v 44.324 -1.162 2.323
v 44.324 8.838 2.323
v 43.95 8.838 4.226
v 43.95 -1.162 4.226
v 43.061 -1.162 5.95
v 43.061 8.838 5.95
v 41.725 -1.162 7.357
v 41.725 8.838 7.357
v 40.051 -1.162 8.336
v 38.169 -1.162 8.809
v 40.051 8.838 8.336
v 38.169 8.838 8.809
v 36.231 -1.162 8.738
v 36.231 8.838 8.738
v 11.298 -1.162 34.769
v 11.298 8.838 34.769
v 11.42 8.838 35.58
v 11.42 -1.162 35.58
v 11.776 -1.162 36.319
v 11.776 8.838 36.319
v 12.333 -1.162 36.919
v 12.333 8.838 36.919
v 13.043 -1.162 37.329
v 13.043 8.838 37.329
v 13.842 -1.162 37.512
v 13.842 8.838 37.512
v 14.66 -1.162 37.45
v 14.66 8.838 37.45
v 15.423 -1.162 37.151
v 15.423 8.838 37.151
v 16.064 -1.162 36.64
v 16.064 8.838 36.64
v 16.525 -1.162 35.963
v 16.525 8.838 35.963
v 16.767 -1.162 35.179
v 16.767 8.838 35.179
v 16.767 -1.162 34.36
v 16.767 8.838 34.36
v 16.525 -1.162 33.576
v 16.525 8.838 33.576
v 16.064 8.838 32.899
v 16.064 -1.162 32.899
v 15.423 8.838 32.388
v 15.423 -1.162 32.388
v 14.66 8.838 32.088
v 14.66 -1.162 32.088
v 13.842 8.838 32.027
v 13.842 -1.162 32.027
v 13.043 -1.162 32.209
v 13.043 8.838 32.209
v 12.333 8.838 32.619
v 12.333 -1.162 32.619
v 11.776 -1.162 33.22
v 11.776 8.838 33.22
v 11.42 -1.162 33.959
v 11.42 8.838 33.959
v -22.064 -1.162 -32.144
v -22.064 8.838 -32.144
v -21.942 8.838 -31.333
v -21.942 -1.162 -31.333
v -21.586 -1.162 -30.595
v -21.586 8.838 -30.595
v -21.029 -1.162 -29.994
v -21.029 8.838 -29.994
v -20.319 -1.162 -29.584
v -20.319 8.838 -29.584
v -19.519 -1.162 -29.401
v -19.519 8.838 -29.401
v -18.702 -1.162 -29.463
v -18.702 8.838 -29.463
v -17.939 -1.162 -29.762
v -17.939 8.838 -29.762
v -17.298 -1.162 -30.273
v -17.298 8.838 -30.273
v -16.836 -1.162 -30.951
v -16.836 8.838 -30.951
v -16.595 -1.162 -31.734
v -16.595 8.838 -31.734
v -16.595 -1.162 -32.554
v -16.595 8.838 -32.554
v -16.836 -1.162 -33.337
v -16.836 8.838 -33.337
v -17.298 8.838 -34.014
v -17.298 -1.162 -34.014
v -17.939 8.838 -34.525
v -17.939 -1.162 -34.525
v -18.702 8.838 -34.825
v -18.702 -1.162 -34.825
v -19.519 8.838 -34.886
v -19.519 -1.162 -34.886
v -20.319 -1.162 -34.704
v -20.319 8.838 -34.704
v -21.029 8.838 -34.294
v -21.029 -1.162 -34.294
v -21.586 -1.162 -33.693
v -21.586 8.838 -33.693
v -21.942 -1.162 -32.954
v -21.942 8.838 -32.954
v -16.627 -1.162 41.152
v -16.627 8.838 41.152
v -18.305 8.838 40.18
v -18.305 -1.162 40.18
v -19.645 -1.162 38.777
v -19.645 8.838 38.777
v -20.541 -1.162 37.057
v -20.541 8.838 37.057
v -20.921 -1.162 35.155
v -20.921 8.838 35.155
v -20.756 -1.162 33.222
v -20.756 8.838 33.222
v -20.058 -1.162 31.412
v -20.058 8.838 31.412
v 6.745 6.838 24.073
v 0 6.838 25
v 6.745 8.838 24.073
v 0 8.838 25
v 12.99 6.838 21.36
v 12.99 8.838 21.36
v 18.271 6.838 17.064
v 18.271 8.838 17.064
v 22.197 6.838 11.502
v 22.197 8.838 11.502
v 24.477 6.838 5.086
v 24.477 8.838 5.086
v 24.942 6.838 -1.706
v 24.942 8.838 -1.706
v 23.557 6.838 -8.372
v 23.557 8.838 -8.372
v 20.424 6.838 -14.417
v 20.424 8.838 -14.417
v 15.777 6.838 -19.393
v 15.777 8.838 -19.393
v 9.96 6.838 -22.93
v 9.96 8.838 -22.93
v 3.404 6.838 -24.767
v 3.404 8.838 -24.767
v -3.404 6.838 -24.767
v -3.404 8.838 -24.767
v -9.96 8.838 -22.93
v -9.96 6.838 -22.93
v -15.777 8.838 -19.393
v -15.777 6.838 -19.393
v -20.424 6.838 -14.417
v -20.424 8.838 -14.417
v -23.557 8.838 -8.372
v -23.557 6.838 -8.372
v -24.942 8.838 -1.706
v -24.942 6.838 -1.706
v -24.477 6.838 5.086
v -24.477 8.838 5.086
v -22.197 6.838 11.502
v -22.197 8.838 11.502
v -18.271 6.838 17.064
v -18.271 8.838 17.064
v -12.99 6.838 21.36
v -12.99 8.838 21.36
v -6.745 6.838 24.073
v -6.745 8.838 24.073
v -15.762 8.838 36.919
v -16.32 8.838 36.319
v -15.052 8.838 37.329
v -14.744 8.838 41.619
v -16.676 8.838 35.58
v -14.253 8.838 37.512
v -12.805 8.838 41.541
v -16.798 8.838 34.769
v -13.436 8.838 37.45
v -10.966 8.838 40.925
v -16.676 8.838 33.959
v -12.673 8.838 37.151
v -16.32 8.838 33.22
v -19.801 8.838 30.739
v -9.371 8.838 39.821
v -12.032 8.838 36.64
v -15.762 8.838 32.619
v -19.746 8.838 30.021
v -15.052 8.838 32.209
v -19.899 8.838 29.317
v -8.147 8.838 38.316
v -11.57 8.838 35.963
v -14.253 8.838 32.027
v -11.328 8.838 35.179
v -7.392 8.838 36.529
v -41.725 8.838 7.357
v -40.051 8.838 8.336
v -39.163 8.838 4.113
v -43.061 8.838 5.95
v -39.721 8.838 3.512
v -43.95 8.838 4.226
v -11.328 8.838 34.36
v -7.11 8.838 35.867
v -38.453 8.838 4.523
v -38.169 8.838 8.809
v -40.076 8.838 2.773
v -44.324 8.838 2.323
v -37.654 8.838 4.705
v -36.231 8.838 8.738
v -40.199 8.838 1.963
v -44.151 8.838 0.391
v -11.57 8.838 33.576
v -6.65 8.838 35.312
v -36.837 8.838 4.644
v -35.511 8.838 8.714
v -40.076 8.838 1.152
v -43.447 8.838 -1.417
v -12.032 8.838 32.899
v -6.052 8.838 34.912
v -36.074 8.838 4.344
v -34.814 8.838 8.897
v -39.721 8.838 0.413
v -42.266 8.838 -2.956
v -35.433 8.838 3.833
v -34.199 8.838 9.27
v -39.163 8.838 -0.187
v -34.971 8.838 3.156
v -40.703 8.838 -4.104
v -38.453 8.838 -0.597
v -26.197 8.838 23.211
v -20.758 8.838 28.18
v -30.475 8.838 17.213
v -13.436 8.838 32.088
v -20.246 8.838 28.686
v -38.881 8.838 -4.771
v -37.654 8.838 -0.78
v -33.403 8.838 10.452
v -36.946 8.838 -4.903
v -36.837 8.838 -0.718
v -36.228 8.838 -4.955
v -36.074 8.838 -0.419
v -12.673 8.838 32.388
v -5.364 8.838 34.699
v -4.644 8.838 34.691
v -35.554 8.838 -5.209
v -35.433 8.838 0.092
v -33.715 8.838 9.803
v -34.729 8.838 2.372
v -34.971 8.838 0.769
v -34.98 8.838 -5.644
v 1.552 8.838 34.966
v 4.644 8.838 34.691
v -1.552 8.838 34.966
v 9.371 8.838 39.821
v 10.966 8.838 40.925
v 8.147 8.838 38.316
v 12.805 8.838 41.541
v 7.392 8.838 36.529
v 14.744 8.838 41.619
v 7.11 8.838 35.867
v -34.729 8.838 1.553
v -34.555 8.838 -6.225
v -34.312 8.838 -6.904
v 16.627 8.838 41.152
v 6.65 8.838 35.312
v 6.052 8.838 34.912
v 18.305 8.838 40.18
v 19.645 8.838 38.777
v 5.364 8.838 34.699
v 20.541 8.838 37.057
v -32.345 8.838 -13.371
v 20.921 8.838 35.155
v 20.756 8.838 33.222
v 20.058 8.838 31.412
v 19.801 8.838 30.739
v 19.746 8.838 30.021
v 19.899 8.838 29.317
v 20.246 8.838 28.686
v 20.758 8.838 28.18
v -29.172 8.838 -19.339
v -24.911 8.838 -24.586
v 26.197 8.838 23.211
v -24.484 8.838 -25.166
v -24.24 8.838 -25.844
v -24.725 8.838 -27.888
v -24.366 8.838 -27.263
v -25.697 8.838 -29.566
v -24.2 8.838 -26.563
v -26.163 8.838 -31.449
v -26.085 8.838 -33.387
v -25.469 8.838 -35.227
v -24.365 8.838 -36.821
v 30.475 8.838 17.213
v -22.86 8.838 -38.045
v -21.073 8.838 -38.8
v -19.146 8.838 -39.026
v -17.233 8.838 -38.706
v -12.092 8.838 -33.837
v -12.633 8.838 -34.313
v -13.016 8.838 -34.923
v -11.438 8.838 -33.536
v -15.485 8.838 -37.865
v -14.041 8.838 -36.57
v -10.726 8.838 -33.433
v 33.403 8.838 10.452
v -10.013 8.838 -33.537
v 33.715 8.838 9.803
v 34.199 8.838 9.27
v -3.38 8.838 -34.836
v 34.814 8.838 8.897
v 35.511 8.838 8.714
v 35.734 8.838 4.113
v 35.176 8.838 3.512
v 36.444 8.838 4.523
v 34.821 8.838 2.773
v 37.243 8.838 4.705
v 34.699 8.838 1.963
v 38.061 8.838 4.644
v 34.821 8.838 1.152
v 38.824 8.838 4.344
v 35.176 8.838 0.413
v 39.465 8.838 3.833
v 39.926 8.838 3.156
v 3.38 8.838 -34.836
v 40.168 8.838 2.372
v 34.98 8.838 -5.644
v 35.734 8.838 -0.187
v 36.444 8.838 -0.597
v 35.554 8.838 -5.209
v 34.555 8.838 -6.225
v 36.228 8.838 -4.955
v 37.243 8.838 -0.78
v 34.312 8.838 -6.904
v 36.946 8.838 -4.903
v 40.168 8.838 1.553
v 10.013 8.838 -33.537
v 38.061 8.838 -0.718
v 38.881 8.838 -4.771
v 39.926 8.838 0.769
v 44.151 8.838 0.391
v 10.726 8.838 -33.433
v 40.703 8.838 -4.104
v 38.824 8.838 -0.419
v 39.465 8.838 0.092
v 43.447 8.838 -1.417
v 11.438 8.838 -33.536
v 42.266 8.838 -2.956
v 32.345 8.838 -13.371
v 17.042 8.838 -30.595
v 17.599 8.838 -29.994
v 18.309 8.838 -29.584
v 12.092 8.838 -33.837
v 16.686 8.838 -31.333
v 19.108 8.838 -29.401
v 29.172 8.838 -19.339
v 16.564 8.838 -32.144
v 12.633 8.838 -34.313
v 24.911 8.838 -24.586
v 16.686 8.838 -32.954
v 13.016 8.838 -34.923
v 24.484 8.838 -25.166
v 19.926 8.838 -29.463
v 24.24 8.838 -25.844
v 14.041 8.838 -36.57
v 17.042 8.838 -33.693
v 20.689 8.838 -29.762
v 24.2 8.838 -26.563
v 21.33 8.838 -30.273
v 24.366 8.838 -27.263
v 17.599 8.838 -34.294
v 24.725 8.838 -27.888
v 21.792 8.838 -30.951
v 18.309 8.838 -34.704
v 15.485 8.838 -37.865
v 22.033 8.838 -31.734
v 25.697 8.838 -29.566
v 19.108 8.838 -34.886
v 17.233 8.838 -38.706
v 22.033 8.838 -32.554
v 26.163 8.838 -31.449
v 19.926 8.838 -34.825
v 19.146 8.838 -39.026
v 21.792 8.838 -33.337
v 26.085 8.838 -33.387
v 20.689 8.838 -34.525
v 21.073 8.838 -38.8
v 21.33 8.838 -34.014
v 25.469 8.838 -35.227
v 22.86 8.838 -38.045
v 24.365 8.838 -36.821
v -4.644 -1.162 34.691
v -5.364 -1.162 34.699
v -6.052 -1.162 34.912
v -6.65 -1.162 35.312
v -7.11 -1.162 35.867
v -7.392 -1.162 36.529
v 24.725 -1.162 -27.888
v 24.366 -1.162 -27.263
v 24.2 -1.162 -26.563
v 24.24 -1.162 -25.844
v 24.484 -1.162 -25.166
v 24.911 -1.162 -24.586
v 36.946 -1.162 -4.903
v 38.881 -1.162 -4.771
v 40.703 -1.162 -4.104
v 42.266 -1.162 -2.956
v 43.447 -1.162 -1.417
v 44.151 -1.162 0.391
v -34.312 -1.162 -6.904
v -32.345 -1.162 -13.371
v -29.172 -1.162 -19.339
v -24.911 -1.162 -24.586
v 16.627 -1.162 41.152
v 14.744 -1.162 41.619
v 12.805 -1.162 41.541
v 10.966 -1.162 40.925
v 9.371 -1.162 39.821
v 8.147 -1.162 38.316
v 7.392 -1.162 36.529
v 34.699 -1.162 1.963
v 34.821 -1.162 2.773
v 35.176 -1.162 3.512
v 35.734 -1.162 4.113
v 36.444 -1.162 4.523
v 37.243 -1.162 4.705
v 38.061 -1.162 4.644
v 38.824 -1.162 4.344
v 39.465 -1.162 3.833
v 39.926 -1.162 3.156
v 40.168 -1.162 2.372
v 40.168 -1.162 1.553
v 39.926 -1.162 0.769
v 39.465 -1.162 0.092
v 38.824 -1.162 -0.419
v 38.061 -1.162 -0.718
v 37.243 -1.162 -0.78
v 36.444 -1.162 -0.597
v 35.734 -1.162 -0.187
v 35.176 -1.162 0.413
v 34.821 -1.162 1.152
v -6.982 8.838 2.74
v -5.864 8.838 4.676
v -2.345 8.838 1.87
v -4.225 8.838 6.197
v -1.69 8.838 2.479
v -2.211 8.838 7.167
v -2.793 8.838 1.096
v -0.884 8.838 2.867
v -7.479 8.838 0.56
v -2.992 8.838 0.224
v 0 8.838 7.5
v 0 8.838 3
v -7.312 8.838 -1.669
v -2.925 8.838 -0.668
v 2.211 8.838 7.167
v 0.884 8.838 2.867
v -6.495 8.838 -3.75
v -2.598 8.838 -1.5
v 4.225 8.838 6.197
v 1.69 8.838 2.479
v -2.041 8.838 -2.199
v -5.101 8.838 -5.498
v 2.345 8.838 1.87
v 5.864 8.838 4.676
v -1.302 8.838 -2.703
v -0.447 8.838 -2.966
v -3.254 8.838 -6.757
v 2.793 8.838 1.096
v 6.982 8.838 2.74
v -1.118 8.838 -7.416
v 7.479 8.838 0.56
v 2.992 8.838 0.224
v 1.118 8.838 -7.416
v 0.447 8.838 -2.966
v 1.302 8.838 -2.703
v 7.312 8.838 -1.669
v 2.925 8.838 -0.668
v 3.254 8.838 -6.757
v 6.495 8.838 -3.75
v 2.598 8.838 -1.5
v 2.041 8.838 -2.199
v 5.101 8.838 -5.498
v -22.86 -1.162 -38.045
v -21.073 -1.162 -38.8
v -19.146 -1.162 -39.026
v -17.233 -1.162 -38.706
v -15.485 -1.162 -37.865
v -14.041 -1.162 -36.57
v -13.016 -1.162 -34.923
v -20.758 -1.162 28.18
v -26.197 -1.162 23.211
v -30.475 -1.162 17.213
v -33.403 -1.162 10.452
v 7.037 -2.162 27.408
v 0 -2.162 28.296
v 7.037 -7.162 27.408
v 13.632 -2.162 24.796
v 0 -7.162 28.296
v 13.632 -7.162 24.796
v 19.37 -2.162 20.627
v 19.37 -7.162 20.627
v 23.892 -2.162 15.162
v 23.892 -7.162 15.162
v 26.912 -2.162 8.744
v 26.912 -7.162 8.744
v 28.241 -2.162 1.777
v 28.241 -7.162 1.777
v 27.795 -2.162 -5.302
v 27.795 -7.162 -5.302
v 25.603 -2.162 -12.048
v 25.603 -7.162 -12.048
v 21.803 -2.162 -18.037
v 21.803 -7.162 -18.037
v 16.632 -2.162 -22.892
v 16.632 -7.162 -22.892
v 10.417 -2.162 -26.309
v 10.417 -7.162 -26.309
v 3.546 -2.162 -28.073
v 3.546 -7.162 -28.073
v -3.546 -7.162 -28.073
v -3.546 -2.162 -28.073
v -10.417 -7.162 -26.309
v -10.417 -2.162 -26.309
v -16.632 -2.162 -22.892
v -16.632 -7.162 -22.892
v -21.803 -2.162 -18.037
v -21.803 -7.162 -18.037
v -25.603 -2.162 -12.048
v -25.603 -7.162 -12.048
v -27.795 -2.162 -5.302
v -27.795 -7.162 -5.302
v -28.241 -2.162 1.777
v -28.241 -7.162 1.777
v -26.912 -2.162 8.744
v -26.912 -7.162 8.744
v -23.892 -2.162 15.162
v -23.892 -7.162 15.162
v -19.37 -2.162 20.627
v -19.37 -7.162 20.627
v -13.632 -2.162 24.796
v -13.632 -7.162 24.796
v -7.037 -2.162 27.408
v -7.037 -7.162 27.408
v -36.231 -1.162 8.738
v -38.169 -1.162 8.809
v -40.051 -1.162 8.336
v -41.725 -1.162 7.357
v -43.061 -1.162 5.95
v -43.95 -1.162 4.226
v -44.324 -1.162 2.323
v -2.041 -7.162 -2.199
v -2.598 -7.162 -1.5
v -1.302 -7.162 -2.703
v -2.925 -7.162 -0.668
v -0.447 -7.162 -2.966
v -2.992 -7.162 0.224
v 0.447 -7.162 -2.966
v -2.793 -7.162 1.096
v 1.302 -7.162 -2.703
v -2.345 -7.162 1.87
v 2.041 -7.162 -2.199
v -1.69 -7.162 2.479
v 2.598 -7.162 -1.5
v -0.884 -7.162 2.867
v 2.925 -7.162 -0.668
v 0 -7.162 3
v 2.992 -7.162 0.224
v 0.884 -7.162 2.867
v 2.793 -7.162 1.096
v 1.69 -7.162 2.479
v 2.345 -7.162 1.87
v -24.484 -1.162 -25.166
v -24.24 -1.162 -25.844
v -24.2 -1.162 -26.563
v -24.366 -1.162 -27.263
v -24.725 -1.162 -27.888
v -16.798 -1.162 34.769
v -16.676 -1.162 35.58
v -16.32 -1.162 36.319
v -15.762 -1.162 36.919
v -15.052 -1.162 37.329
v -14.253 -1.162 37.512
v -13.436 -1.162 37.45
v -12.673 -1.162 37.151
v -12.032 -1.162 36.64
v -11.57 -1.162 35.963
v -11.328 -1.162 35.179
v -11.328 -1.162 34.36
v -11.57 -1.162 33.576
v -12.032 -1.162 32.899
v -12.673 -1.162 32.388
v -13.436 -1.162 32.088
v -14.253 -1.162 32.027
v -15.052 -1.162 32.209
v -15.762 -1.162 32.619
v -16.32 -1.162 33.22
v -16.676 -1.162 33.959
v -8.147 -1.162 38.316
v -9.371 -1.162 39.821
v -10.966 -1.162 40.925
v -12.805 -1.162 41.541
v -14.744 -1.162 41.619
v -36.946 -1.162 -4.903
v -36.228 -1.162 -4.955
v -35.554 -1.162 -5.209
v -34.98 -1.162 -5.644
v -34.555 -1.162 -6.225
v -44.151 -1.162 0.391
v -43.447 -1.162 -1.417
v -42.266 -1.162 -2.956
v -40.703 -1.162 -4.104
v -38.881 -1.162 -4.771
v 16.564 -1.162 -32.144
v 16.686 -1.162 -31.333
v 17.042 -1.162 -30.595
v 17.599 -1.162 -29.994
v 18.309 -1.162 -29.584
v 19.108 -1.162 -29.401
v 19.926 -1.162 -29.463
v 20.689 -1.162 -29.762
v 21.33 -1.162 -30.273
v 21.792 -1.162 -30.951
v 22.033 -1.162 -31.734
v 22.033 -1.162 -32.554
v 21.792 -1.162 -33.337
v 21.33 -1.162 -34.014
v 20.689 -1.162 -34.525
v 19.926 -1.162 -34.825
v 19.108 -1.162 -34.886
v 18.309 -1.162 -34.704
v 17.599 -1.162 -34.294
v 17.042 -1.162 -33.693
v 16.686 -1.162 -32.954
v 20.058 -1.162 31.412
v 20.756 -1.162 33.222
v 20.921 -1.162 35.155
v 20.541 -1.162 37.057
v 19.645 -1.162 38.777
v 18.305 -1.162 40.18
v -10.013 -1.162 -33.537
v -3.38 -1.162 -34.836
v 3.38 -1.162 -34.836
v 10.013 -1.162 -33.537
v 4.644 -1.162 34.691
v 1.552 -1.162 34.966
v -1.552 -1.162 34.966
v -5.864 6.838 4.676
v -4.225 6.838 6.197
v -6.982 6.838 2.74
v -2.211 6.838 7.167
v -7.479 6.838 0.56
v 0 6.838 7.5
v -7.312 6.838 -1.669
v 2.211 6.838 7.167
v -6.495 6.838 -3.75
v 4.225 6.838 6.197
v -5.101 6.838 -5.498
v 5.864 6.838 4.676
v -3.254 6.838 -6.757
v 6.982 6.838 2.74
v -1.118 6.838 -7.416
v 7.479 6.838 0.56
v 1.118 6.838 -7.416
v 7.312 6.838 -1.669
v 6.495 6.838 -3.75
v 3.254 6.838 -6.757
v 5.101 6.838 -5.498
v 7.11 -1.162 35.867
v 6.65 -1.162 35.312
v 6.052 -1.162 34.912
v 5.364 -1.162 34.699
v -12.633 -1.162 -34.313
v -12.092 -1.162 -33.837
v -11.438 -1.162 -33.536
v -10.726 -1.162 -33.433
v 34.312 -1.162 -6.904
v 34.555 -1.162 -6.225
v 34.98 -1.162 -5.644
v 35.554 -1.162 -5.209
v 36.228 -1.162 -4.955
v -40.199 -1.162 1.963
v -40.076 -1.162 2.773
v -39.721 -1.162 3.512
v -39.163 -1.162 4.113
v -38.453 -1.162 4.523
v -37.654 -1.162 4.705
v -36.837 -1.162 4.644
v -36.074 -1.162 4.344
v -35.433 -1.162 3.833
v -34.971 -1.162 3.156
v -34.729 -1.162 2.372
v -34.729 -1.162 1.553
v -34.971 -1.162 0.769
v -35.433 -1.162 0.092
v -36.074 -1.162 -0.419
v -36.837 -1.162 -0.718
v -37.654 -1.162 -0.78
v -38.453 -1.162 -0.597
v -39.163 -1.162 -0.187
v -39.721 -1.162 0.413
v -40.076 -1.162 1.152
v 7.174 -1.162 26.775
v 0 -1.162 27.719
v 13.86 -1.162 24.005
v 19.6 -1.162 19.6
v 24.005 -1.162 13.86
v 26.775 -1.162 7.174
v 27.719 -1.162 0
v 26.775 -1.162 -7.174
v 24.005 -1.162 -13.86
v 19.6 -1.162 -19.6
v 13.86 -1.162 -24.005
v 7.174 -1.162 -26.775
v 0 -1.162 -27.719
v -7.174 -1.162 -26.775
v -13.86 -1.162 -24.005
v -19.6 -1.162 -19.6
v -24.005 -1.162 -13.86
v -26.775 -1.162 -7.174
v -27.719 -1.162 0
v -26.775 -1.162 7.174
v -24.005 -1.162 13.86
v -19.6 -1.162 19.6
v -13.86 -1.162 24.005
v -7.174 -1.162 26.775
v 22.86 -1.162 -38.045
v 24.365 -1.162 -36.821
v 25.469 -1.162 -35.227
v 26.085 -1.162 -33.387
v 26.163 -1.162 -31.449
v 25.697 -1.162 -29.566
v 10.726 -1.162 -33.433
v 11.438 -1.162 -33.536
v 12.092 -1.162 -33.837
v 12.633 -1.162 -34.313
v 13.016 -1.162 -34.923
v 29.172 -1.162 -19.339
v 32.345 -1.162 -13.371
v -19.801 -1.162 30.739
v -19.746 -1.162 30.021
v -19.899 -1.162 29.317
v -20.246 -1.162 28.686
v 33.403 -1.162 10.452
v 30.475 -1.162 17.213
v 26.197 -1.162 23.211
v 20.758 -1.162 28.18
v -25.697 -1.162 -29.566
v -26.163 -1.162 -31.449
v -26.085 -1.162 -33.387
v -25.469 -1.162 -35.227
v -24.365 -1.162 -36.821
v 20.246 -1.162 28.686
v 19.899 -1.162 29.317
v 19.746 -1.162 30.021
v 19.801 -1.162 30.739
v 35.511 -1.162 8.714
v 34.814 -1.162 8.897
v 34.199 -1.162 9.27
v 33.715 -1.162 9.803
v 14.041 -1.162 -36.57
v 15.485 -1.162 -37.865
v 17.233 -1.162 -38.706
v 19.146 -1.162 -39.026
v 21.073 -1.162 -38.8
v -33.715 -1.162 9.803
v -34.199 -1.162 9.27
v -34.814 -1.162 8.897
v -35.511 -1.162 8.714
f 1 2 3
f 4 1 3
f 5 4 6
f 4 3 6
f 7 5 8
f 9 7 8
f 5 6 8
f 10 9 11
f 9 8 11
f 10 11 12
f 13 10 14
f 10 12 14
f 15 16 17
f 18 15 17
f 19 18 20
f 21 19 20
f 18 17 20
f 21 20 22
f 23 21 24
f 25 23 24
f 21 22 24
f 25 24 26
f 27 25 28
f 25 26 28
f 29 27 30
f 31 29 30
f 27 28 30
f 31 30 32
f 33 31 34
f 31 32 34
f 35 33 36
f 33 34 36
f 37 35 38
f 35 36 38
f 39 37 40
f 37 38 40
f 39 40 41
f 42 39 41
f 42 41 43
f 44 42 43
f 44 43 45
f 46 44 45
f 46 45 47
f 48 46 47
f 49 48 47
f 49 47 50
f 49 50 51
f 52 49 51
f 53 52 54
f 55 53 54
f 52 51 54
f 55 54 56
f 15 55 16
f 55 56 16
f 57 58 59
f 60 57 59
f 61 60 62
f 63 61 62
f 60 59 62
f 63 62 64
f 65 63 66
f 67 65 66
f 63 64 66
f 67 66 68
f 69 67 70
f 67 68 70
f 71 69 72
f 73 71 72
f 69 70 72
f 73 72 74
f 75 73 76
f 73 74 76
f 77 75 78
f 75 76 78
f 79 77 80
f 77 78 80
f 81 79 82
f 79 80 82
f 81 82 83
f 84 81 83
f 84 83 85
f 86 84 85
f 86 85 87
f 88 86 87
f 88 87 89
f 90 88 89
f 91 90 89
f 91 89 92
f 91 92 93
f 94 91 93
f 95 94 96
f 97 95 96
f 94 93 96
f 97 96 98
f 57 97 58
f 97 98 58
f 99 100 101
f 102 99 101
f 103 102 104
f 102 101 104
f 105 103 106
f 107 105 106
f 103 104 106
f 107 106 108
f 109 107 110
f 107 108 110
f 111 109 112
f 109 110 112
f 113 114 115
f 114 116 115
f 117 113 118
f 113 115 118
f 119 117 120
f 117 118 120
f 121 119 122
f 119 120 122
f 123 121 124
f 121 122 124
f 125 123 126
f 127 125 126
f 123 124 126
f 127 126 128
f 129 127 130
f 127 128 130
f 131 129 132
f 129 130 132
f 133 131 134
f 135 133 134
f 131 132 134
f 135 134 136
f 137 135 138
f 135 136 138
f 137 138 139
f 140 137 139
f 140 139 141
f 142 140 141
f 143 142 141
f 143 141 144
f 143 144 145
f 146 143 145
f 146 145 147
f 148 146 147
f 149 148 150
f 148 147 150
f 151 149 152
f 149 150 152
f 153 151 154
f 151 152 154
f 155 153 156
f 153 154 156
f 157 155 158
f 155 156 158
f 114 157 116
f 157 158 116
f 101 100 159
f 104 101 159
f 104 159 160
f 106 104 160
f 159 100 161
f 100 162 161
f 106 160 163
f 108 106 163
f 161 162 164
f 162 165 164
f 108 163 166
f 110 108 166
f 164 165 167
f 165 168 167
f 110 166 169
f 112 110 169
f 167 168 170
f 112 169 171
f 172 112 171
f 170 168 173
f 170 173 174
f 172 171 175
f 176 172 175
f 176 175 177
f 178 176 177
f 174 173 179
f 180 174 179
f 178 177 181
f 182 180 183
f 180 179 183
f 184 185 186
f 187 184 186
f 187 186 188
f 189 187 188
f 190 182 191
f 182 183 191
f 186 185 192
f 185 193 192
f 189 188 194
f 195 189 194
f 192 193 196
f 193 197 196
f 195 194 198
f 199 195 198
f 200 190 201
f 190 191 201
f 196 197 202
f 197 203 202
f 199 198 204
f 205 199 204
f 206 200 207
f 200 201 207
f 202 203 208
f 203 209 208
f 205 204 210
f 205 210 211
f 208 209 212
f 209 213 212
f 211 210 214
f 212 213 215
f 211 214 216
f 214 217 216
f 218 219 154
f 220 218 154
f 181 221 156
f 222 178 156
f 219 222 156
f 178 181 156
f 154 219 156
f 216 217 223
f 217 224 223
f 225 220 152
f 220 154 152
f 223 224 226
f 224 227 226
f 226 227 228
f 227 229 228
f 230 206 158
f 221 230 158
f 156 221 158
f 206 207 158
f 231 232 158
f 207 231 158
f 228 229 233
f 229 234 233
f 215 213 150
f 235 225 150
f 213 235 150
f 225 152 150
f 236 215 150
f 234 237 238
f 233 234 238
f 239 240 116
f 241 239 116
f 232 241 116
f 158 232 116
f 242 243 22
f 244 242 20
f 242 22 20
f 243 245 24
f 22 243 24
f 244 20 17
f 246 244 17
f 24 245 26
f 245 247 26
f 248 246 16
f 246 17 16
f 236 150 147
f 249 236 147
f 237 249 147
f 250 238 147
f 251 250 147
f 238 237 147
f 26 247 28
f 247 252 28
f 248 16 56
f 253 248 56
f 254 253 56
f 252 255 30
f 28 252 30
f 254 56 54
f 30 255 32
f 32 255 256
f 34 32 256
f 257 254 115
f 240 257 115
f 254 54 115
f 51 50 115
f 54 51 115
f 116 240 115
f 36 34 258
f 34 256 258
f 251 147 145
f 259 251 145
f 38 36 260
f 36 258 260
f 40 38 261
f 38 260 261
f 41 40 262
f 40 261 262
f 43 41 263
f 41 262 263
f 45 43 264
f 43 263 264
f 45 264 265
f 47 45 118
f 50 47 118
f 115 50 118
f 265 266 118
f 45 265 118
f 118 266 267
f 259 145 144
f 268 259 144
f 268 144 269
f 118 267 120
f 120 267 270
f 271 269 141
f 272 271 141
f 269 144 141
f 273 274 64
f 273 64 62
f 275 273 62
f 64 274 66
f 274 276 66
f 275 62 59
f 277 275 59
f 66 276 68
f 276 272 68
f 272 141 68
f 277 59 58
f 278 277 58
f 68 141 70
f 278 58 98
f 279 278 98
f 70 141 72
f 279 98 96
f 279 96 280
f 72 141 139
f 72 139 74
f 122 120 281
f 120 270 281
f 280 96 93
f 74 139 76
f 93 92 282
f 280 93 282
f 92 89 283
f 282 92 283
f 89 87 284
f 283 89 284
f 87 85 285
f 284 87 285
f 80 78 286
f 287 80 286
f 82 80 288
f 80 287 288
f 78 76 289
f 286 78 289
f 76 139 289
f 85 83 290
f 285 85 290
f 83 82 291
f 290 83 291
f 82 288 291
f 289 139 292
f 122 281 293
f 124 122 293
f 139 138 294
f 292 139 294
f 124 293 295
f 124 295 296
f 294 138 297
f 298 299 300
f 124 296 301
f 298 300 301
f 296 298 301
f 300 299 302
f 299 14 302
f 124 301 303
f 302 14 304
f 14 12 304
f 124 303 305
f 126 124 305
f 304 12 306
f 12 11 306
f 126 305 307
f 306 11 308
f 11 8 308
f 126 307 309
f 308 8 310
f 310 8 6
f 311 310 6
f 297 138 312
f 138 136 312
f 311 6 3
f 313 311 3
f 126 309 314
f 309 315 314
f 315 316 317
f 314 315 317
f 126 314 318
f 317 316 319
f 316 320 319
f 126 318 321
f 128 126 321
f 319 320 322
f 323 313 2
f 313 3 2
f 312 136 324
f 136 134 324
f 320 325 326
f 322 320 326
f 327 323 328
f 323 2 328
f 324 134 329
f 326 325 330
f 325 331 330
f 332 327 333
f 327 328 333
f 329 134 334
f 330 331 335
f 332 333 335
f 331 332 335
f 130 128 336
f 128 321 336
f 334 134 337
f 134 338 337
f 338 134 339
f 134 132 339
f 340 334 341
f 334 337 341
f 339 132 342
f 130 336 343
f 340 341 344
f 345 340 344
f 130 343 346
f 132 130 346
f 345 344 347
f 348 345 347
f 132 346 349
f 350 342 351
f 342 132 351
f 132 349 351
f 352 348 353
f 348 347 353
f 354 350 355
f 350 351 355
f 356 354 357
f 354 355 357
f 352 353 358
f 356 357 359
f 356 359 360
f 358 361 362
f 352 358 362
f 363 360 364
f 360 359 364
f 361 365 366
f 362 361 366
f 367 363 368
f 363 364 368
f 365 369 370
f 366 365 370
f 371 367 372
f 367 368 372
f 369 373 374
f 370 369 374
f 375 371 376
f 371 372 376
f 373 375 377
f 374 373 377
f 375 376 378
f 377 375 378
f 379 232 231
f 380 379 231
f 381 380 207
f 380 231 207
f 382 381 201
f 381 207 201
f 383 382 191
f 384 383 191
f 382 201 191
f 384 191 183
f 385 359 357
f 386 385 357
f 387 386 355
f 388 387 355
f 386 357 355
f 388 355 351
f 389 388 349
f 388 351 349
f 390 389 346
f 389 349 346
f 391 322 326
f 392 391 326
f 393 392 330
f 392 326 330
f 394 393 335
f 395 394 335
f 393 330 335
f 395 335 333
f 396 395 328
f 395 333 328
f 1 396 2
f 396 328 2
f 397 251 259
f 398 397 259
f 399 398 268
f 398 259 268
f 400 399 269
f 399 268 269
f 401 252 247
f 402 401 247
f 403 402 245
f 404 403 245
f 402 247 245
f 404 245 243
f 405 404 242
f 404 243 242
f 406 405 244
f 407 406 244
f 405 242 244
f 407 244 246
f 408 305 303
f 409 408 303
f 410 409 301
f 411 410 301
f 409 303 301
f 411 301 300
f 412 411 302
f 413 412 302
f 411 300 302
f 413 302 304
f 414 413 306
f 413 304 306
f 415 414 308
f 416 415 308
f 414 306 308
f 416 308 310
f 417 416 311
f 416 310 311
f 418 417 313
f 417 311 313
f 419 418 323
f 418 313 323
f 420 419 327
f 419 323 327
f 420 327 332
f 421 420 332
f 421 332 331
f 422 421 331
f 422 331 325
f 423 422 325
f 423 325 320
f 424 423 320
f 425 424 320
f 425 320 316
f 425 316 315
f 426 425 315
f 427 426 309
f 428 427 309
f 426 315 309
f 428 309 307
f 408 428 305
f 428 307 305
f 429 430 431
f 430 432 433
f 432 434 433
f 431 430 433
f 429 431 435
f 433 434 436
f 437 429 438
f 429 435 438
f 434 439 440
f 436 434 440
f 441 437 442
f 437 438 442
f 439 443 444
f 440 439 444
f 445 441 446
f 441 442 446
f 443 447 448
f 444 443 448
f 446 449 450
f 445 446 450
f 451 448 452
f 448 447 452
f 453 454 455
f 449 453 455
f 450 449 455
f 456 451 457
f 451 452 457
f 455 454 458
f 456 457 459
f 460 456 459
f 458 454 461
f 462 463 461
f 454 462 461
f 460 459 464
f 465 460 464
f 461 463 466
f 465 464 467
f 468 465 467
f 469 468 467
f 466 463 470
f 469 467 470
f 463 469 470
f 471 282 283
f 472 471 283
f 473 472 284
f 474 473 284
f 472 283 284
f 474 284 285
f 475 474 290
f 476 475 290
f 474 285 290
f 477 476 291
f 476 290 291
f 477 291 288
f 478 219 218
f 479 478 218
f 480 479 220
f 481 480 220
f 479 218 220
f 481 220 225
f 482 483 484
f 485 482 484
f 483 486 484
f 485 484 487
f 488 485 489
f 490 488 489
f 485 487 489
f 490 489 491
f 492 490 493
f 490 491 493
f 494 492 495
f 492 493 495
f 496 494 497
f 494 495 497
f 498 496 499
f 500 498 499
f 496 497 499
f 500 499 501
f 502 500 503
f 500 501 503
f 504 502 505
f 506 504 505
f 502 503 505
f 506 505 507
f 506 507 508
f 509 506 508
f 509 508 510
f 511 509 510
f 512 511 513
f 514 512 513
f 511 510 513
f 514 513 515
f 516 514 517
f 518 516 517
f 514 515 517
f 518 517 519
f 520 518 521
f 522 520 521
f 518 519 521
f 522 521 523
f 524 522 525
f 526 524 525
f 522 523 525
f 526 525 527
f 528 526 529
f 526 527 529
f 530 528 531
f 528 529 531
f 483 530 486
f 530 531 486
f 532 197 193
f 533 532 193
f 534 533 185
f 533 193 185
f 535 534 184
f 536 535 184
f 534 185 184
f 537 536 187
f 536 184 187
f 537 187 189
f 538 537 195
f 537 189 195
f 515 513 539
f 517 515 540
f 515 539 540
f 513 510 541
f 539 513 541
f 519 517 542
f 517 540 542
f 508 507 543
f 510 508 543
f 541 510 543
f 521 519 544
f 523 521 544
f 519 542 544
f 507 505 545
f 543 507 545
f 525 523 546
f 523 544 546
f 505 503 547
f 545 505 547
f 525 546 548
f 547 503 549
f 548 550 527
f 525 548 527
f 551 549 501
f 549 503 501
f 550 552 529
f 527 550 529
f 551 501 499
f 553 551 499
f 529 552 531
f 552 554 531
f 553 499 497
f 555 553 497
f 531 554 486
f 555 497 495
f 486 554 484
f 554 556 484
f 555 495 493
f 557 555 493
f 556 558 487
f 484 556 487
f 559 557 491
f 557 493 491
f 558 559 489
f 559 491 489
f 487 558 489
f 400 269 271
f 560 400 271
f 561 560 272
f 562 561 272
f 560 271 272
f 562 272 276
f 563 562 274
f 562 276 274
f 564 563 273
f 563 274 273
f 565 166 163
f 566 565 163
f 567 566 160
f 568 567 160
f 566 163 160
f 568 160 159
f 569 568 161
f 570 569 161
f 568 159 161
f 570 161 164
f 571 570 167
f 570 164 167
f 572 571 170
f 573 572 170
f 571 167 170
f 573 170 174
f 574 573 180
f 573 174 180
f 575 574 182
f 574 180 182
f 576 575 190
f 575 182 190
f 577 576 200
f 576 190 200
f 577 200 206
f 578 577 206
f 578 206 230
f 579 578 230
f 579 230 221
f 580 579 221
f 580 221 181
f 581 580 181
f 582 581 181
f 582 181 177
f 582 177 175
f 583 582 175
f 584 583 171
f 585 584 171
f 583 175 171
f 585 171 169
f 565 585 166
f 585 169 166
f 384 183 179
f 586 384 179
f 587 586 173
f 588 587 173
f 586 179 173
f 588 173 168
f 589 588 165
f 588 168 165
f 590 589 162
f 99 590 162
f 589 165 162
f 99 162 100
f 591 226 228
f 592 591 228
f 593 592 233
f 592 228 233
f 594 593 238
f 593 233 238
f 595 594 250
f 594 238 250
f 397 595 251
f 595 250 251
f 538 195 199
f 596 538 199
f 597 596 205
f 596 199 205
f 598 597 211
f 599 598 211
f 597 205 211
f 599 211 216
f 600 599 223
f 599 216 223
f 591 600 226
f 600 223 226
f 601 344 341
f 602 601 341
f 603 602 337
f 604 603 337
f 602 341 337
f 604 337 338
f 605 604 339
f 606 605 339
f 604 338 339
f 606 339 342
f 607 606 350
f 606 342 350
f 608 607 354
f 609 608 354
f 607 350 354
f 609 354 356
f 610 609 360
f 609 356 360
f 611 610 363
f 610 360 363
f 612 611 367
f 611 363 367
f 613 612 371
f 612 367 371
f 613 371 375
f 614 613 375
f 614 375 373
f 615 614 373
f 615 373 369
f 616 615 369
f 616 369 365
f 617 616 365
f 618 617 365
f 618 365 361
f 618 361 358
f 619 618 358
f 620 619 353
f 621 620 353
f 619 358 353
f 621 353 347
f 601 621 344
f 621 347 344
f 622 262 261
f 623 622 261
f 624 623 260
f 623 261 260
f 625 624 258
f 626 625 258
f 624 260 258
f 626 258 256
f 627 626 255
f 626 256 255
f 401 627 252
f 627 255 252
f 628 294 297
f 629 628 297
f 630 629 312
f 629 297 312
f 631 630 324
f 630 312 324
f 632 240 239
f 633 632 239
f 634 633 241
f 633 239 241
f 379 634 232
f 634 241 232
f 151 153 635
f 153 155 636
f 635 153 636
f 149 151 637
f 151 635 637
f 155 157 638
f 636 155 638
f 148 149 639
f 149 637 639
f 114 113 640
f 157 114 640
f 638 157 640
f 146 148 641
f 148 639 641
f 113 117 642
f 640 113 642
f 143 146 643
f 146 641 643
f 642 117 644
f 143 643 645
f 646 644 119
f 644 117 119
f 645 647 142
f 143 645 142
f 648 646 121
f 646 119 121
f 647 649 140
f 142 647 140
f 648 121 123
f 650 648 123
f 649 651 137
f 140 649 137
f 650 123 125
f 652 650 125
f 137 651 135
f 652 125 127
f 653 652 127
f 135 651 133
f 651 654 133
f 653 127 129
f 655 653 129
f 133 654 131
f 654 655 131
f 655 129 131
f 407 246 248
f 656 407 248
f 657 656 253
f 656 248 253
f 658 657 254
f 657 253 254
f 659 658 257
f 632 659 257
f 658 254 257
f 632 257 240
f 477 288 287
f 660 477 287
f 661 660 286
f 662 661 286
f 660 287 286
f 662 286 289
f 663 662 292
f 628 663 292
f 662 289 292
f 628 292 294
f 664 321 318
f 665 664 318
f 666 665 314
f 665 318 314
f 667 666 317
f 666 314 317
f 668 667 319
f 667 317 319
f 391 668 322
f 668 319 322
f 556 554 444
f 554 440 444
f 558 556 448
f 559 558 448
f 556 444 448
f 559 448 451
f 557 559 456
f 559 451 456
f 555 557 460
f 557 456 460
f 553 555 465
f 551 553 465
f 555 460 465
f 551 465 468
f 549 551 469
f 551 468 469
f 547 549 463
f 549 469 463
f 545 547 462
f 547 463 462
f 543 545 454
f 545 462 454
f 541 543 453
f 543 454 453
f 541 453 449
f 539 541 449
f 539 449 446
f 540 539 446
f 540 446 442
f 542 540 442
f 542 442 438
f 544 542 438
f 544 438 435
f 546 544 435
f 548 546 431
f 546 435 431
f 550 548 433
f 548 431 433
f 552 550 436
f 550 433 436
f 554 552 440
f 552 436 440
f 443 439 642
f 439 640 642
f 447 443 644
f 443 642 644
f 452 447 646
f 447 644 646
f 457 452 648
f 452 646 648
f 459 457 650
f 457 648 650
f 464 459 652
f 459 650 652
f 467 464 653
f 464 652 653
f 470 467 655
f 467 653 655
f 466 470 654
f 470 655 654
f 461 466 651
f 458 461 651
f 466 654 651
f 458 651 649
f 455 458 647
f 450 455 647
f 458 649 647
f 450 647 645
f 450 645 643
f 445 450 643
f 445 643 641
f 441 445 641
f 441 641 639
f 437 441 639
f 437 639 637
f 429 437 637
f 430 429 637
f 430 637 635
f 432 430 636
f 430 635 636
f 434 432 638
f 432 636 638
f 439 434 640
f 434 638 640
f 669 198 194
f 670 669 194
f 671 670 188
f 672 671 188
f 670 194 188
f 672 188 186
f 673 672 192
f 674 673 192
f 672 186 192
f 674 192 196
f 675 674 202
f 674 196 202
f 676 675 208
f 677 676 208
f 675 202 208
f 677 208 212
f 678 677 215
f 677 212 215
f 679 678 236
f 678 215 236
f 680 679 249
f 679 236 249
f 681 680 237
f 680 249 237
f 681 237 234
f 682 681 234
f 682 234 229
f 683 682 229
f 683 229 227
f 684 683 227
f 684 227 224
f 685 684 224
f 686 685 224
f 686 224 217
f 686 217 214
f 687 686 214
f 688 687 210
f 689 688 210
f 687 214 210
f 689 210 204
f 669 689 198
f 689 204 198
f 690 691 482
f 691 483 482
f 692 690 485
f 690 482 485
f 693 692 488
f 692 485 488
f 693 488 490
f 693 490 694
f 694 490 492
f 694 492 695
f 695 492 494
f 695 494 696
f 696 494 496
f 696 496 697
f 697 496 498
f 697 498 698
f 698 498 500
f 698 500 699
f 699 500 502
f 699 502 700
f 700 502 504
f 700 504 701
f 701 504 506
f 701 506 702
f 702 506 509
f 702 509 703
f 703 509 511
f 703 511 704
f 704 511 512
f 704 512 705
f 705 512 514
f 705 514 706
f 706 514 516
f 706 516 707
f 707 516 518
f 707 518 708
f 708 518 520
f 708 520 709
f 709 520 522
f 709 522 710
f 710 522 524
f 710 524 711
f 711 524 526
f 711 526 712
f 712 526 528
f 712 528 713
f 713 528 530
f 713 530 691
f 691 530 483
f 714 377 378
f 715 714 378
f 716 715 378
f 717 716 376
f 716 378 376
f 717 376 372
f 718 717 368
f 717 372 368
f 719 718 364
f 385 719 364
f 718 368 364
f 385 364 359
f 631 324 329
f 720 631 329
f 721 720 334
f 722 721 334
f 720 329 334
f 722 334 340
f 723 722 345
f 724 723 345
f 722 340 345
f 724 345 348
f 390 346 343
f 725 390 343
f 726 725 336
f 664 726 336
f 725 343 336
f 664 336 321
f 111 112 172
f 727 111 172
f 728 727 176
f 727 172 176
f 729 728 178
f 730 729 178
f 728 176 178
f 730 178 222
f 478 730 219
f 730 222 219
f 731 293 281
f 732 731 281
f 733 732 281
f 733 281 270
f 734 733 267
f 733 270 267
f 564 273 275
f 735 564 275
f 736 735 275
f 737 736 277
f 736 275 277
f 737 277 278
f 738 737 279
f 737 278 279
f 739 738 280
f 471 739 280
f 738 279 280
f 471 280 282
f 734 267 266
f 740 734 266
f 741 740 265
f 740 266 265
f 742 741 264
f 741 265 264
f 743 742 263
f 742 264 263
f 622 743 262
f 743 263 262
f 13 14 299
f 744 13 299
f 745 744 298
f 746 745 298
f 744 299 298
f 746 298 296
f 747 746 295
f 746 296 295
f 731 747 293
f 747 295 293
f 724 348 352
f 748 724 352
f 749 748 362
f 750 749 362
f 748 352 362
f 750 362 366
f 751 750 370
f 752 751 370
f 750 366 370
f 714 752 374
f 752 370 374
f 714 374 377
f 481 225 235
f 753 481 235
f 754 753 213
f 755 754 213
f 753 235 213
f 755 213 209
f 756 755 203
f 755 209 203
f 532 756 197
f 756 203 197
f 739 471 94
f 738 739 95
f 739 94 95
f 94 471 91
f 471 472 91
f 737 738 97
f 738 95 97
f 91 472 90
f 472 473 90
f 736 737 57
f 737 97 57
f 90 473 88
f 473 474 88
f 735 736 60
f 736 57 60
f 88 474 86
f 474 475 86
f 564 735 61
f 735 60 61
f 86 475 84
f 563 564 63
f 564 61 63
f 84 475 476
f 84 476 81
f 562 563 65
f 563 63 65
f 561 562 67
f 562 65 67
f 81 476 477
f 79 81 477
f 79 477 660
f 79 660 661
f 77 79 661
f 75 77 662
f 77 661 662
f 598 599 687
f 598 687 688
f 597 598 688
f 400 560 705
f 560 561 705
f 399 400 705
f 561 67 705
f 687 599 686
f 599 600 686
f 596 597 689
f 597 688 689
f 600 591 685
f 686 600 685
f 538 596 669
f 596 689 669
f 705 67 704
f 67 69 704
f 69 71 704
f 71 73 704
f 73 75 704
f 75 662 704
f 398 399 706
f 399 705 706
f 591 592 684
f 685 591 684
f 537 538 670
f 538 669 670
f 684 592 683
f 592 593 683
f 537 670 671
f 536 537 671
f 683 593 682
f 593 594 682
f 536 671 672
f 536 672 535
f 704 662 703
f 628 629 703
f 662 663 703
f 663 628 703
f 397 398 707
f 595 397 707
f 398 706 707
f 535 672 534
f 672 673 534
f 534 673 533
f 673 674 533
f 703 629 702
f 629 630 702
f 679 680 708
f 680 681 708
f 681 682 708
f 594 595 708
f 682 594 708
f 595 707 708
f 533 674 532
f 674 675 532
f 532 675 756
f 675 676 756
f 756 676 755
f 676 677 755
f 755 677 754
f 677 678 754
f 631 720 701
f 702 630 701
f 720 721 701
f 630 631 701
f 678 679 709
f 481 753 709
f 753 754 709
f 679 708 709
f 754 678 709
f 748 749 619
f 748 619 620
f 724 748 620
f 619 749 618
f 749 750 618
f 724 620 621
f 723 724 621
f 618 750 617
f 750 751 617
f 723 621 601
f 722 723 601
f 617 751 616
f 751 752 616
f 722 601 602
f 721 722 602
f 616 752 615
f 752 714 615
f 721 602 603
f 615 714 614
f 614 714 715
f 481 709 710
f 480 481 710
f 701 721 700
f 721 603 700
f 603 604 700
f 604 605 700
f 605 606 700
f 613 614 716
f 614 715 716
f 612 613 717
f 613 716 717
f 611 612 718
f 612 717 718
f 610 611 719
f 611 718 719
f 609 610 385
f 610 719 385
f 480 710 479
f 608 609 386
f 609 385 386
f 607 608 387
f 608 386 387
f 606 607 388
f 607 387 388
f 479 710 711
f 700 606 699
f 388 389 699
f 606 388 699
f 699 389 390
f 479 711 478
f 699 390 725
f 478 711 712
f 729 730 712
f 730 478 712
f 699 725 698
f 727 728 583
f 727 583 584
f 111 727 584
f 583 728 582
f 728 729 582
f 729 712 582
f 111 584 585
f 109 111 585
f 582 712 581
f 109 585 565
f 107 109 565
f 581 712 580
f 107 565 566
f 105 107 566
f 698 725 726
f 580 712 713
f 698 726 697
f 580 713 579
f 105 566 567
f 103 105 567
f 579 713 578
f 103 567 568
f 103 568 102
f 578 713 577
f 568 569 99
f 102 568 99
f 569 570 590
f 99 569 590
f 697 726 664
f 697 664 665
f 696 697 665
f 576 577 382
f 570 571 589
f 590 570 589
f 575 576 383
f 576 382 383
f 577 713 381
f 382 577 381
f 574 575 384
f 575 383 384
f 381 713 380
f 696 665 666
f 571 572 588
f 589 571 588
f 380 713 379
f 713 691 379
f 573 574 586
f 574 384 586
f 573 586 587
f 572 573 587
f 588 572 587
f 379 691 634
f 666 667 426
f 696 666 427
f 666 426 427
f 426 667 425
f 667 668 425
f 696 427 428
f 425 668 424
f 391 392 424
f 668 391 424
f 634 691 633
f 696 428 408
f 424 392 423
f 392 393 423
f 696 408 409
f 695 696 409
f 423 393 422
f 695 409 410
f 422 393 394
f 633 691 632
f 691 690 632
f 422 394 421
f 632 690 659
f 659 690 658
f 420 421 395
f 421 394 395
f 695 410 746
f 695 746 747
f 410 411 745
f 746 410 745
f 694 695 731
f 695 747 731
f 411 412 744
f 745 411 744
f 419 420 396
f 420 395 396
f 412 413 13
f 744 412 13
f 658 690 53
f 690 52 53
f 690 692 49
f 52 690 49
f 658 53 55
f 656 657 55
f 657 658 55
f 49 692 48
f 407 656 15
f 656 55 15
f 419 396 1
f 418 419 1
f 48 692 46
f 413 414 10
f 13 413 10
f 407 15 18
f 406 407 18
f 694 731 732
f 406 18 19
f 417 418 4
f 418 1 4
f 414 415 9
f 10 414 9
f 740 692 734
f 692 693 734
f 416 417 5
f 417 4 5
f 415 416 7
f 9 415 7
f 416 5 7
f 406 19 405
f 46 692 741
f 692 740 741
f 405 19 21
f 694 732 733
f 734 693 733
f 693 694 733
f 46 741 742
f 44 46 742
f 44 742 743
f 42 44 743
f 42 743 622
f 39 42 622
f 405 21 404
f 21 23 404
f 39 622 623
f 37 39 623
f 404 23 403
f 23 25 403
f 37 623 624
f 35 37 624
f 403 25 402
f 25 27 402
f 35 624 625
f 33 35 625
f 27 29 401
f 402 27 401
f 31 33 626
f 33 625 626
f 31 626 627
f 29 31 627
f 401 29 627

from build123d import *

# Parameters (mm, degrees)
F2_R     = 2.75
F3_DEPTH = 10


with BuildPart() as f1:
    # F0 (on Right) → F1 (revolve)
    with BuildSketch(Plane.YZ):
        Polygon((-7.162217, 3), (8.837783, 3), (8.837783, 7.5), (6.837783, 7.5), (6.837783, 25), (8.837783, 25), (8.837783, 44.3844), (-1.162217, 44.3844), (-1.162217, 27.719139), (-2.162217, 28.296489), (-7.162217, 28.296489), align=None)
    revolve(axis=Axis((0, 14.665759, 0), (0, 1, 0)))

    # F2 (on face) → F3 (cut, through all)
    with BuildSketch(Plane(origin=(0, 8.837783, 0), x_dir=(-1, 0, 0), z_dir=(0, 1, 0))):
        with BuildLine():
            ThreePointArc((-33.402795, 10.45243), (-28.494043, 20.324603), (-20.757853, 28.179985))
            ThreePointArc((-20.757853, 28.179985), (-19.797183, 29.663761), (-20.057996, 31.412033))
            ThreePointArc((-20.057996, 31.412033), (-20.54103, 37.056805), (-16.626689, 41.152499))
            ThreePointArc((-16.626689, 41.152499), (-36.134029, 25.774152), (-44.323573, 2.3229))
            ThreePointArc((-44.323573, 2.3229), (-41.725403, 7.35741), (-36.230905, 8.73845))
            ThreePointArc((-36.230905, 8.73845), (-34.492969, 9.061028), (-33.402795, 10.45243))
        make_face()
        with BuildLine():
            ThreePointArc((-36.945845, -4.903419), (-42.265885, -2.955613), (-44.323573, 2.3229))
            ThreePointArc((-44.323573, 2.3229), (-39.189099, -20.837214), (-22.859656, -38.044856))
            ThreePointArc((-22.859656, -38.044856), (-26.085097, -33.387249), (-24.724973, -27.887537))
            ThreePointArc((-24.724973, -27.887537), (-24.193881, -26.201589), (-24.91061, -24.585799))
            ThreePointArc((-24.91061, -24.585799), (-30.903166, -16.431505), (-34.312387, -6.903627))
            ThreePointArc((-34.312387, -6.903627), (-35.251149, -5.405894), (-36.945845, -4.903419))
        make_face()
        with BuildLine():
            ThreePointArc((-13.015562, -34.923261), (-17.23298, -38.706138), (-22.859656, -38.044856))
            ThreePointArc((-22.859656, -38.044856), (0, -44.3844), (22.859656, -38.044856))
            ThreePointArc((22.859656, -38.044856), (17.23298, -38.706138), (13.015562, -34.923261))
            ThreePointArc((13.015562, -34.923261), (11.776291, -33.66283), (10.013149, -33.537097))
            ThreePointArc((10.013149, -33.537097), (0, -35), (-10.013149, -33.537097))
            ThreePointArc((-10.013149, -33.537097), (-11.776291, -33.66283), (-13.015562, -34.923261))
        make_face()
        with BuildLine():
            ThreePointArc((44.3844, 0), (44.369191, 1.161848), (44.323573, 2.3229))
            ThreePointArc((44.323573, 2.3229), (42.265885, -2.955613), (36.945845, -4.903419))
            ThreePointArc((36.945845, -4.903419), (35.251149, -5.405894), (34.312387, -6.903627))
            ThreePointArc((34.312387, -6.903627), (30.903166, -16.431505), (24.91061, -24.585799))
            ThreePointArc((24.91061, -24.585799), (24.193881, -26.201589), (24.724973, -27.887537))
            ThreePointArc((24.724973, -27.887537), (26.085097, -33.387249), (22.859656, -38.044856))
            ThreePointArc((22.859656, -38.044856), (38.630215, -21.855924), (44.3844, 0))
        make_face()
        with BuildLine():
            ThreePointArc((44.323573, 2.3229), (36.134029, 25.774152), (16.626689, 41.152499))
            ThreePointArc((16.626689, 41.152499), (20.54103, 37.056805), (20.057996, 31.412033))
            ThreePointArc((20.057996, 31.412033), (19.797183, 29.663761), (20.757853, 28.179985))
            ThreePointArc((20.757853, 28.179985), (28.494043, 20.324603), (33.402795, 10.45243))
            ThreePointArc((33.402795, 10.45243), (34.492969, 9.061028), (36.230905, 8.73845))
            ThreePointArc((36.230905, 8.73845), (41.725403, 7.35741), (44.323573, 2.3229))
        make_face()
        with BuildLine():
            ThreePointArc((16.626689, 41.152499), (0, 44.3844), (-16.626689, 41.152499))
            ThreePointArc((-16.626689, 41.152499), (-10.965839, 40.925433), (-7.392117, 36.52938))
            ThreePointArc((-7.392117, 36.52938), (-6.365278, 35.090603), (-4.643513, 34.690601))
            ThreePointArc((-4.643513, 34.690601), (0, 35), (4.643513, 34.690601))
            ThreePointArc((4.643513, 34.690601), (6.365278, 35.090603), (7.392117, 36.52938))
            ThreePointArc((7.392117, 36.52938), (10.965839, 40.925433), (16.626689, 41.152499))
        make_face()
        with Locations((-14.047747, 34.769395)):
            Circle(F2_R)
        with Locations((14.047747, 34.769395)):
            Circle(F2_R)
        with Locations((37.448608, 1.962598)):
            Circle(F2_R)
        with Locations((19.313928, -32.143774)):
            Circle(F2_R)
        with Locations((-19.313928, -32.143774)):
            Circle(F2_R)
        with Locations((-37.448608, 1.962598)):
            Circle(F2_R)
    extrude(amount=-F3_DEPTH, mode=Mode.SUBTRACT)


solid = f1.part
